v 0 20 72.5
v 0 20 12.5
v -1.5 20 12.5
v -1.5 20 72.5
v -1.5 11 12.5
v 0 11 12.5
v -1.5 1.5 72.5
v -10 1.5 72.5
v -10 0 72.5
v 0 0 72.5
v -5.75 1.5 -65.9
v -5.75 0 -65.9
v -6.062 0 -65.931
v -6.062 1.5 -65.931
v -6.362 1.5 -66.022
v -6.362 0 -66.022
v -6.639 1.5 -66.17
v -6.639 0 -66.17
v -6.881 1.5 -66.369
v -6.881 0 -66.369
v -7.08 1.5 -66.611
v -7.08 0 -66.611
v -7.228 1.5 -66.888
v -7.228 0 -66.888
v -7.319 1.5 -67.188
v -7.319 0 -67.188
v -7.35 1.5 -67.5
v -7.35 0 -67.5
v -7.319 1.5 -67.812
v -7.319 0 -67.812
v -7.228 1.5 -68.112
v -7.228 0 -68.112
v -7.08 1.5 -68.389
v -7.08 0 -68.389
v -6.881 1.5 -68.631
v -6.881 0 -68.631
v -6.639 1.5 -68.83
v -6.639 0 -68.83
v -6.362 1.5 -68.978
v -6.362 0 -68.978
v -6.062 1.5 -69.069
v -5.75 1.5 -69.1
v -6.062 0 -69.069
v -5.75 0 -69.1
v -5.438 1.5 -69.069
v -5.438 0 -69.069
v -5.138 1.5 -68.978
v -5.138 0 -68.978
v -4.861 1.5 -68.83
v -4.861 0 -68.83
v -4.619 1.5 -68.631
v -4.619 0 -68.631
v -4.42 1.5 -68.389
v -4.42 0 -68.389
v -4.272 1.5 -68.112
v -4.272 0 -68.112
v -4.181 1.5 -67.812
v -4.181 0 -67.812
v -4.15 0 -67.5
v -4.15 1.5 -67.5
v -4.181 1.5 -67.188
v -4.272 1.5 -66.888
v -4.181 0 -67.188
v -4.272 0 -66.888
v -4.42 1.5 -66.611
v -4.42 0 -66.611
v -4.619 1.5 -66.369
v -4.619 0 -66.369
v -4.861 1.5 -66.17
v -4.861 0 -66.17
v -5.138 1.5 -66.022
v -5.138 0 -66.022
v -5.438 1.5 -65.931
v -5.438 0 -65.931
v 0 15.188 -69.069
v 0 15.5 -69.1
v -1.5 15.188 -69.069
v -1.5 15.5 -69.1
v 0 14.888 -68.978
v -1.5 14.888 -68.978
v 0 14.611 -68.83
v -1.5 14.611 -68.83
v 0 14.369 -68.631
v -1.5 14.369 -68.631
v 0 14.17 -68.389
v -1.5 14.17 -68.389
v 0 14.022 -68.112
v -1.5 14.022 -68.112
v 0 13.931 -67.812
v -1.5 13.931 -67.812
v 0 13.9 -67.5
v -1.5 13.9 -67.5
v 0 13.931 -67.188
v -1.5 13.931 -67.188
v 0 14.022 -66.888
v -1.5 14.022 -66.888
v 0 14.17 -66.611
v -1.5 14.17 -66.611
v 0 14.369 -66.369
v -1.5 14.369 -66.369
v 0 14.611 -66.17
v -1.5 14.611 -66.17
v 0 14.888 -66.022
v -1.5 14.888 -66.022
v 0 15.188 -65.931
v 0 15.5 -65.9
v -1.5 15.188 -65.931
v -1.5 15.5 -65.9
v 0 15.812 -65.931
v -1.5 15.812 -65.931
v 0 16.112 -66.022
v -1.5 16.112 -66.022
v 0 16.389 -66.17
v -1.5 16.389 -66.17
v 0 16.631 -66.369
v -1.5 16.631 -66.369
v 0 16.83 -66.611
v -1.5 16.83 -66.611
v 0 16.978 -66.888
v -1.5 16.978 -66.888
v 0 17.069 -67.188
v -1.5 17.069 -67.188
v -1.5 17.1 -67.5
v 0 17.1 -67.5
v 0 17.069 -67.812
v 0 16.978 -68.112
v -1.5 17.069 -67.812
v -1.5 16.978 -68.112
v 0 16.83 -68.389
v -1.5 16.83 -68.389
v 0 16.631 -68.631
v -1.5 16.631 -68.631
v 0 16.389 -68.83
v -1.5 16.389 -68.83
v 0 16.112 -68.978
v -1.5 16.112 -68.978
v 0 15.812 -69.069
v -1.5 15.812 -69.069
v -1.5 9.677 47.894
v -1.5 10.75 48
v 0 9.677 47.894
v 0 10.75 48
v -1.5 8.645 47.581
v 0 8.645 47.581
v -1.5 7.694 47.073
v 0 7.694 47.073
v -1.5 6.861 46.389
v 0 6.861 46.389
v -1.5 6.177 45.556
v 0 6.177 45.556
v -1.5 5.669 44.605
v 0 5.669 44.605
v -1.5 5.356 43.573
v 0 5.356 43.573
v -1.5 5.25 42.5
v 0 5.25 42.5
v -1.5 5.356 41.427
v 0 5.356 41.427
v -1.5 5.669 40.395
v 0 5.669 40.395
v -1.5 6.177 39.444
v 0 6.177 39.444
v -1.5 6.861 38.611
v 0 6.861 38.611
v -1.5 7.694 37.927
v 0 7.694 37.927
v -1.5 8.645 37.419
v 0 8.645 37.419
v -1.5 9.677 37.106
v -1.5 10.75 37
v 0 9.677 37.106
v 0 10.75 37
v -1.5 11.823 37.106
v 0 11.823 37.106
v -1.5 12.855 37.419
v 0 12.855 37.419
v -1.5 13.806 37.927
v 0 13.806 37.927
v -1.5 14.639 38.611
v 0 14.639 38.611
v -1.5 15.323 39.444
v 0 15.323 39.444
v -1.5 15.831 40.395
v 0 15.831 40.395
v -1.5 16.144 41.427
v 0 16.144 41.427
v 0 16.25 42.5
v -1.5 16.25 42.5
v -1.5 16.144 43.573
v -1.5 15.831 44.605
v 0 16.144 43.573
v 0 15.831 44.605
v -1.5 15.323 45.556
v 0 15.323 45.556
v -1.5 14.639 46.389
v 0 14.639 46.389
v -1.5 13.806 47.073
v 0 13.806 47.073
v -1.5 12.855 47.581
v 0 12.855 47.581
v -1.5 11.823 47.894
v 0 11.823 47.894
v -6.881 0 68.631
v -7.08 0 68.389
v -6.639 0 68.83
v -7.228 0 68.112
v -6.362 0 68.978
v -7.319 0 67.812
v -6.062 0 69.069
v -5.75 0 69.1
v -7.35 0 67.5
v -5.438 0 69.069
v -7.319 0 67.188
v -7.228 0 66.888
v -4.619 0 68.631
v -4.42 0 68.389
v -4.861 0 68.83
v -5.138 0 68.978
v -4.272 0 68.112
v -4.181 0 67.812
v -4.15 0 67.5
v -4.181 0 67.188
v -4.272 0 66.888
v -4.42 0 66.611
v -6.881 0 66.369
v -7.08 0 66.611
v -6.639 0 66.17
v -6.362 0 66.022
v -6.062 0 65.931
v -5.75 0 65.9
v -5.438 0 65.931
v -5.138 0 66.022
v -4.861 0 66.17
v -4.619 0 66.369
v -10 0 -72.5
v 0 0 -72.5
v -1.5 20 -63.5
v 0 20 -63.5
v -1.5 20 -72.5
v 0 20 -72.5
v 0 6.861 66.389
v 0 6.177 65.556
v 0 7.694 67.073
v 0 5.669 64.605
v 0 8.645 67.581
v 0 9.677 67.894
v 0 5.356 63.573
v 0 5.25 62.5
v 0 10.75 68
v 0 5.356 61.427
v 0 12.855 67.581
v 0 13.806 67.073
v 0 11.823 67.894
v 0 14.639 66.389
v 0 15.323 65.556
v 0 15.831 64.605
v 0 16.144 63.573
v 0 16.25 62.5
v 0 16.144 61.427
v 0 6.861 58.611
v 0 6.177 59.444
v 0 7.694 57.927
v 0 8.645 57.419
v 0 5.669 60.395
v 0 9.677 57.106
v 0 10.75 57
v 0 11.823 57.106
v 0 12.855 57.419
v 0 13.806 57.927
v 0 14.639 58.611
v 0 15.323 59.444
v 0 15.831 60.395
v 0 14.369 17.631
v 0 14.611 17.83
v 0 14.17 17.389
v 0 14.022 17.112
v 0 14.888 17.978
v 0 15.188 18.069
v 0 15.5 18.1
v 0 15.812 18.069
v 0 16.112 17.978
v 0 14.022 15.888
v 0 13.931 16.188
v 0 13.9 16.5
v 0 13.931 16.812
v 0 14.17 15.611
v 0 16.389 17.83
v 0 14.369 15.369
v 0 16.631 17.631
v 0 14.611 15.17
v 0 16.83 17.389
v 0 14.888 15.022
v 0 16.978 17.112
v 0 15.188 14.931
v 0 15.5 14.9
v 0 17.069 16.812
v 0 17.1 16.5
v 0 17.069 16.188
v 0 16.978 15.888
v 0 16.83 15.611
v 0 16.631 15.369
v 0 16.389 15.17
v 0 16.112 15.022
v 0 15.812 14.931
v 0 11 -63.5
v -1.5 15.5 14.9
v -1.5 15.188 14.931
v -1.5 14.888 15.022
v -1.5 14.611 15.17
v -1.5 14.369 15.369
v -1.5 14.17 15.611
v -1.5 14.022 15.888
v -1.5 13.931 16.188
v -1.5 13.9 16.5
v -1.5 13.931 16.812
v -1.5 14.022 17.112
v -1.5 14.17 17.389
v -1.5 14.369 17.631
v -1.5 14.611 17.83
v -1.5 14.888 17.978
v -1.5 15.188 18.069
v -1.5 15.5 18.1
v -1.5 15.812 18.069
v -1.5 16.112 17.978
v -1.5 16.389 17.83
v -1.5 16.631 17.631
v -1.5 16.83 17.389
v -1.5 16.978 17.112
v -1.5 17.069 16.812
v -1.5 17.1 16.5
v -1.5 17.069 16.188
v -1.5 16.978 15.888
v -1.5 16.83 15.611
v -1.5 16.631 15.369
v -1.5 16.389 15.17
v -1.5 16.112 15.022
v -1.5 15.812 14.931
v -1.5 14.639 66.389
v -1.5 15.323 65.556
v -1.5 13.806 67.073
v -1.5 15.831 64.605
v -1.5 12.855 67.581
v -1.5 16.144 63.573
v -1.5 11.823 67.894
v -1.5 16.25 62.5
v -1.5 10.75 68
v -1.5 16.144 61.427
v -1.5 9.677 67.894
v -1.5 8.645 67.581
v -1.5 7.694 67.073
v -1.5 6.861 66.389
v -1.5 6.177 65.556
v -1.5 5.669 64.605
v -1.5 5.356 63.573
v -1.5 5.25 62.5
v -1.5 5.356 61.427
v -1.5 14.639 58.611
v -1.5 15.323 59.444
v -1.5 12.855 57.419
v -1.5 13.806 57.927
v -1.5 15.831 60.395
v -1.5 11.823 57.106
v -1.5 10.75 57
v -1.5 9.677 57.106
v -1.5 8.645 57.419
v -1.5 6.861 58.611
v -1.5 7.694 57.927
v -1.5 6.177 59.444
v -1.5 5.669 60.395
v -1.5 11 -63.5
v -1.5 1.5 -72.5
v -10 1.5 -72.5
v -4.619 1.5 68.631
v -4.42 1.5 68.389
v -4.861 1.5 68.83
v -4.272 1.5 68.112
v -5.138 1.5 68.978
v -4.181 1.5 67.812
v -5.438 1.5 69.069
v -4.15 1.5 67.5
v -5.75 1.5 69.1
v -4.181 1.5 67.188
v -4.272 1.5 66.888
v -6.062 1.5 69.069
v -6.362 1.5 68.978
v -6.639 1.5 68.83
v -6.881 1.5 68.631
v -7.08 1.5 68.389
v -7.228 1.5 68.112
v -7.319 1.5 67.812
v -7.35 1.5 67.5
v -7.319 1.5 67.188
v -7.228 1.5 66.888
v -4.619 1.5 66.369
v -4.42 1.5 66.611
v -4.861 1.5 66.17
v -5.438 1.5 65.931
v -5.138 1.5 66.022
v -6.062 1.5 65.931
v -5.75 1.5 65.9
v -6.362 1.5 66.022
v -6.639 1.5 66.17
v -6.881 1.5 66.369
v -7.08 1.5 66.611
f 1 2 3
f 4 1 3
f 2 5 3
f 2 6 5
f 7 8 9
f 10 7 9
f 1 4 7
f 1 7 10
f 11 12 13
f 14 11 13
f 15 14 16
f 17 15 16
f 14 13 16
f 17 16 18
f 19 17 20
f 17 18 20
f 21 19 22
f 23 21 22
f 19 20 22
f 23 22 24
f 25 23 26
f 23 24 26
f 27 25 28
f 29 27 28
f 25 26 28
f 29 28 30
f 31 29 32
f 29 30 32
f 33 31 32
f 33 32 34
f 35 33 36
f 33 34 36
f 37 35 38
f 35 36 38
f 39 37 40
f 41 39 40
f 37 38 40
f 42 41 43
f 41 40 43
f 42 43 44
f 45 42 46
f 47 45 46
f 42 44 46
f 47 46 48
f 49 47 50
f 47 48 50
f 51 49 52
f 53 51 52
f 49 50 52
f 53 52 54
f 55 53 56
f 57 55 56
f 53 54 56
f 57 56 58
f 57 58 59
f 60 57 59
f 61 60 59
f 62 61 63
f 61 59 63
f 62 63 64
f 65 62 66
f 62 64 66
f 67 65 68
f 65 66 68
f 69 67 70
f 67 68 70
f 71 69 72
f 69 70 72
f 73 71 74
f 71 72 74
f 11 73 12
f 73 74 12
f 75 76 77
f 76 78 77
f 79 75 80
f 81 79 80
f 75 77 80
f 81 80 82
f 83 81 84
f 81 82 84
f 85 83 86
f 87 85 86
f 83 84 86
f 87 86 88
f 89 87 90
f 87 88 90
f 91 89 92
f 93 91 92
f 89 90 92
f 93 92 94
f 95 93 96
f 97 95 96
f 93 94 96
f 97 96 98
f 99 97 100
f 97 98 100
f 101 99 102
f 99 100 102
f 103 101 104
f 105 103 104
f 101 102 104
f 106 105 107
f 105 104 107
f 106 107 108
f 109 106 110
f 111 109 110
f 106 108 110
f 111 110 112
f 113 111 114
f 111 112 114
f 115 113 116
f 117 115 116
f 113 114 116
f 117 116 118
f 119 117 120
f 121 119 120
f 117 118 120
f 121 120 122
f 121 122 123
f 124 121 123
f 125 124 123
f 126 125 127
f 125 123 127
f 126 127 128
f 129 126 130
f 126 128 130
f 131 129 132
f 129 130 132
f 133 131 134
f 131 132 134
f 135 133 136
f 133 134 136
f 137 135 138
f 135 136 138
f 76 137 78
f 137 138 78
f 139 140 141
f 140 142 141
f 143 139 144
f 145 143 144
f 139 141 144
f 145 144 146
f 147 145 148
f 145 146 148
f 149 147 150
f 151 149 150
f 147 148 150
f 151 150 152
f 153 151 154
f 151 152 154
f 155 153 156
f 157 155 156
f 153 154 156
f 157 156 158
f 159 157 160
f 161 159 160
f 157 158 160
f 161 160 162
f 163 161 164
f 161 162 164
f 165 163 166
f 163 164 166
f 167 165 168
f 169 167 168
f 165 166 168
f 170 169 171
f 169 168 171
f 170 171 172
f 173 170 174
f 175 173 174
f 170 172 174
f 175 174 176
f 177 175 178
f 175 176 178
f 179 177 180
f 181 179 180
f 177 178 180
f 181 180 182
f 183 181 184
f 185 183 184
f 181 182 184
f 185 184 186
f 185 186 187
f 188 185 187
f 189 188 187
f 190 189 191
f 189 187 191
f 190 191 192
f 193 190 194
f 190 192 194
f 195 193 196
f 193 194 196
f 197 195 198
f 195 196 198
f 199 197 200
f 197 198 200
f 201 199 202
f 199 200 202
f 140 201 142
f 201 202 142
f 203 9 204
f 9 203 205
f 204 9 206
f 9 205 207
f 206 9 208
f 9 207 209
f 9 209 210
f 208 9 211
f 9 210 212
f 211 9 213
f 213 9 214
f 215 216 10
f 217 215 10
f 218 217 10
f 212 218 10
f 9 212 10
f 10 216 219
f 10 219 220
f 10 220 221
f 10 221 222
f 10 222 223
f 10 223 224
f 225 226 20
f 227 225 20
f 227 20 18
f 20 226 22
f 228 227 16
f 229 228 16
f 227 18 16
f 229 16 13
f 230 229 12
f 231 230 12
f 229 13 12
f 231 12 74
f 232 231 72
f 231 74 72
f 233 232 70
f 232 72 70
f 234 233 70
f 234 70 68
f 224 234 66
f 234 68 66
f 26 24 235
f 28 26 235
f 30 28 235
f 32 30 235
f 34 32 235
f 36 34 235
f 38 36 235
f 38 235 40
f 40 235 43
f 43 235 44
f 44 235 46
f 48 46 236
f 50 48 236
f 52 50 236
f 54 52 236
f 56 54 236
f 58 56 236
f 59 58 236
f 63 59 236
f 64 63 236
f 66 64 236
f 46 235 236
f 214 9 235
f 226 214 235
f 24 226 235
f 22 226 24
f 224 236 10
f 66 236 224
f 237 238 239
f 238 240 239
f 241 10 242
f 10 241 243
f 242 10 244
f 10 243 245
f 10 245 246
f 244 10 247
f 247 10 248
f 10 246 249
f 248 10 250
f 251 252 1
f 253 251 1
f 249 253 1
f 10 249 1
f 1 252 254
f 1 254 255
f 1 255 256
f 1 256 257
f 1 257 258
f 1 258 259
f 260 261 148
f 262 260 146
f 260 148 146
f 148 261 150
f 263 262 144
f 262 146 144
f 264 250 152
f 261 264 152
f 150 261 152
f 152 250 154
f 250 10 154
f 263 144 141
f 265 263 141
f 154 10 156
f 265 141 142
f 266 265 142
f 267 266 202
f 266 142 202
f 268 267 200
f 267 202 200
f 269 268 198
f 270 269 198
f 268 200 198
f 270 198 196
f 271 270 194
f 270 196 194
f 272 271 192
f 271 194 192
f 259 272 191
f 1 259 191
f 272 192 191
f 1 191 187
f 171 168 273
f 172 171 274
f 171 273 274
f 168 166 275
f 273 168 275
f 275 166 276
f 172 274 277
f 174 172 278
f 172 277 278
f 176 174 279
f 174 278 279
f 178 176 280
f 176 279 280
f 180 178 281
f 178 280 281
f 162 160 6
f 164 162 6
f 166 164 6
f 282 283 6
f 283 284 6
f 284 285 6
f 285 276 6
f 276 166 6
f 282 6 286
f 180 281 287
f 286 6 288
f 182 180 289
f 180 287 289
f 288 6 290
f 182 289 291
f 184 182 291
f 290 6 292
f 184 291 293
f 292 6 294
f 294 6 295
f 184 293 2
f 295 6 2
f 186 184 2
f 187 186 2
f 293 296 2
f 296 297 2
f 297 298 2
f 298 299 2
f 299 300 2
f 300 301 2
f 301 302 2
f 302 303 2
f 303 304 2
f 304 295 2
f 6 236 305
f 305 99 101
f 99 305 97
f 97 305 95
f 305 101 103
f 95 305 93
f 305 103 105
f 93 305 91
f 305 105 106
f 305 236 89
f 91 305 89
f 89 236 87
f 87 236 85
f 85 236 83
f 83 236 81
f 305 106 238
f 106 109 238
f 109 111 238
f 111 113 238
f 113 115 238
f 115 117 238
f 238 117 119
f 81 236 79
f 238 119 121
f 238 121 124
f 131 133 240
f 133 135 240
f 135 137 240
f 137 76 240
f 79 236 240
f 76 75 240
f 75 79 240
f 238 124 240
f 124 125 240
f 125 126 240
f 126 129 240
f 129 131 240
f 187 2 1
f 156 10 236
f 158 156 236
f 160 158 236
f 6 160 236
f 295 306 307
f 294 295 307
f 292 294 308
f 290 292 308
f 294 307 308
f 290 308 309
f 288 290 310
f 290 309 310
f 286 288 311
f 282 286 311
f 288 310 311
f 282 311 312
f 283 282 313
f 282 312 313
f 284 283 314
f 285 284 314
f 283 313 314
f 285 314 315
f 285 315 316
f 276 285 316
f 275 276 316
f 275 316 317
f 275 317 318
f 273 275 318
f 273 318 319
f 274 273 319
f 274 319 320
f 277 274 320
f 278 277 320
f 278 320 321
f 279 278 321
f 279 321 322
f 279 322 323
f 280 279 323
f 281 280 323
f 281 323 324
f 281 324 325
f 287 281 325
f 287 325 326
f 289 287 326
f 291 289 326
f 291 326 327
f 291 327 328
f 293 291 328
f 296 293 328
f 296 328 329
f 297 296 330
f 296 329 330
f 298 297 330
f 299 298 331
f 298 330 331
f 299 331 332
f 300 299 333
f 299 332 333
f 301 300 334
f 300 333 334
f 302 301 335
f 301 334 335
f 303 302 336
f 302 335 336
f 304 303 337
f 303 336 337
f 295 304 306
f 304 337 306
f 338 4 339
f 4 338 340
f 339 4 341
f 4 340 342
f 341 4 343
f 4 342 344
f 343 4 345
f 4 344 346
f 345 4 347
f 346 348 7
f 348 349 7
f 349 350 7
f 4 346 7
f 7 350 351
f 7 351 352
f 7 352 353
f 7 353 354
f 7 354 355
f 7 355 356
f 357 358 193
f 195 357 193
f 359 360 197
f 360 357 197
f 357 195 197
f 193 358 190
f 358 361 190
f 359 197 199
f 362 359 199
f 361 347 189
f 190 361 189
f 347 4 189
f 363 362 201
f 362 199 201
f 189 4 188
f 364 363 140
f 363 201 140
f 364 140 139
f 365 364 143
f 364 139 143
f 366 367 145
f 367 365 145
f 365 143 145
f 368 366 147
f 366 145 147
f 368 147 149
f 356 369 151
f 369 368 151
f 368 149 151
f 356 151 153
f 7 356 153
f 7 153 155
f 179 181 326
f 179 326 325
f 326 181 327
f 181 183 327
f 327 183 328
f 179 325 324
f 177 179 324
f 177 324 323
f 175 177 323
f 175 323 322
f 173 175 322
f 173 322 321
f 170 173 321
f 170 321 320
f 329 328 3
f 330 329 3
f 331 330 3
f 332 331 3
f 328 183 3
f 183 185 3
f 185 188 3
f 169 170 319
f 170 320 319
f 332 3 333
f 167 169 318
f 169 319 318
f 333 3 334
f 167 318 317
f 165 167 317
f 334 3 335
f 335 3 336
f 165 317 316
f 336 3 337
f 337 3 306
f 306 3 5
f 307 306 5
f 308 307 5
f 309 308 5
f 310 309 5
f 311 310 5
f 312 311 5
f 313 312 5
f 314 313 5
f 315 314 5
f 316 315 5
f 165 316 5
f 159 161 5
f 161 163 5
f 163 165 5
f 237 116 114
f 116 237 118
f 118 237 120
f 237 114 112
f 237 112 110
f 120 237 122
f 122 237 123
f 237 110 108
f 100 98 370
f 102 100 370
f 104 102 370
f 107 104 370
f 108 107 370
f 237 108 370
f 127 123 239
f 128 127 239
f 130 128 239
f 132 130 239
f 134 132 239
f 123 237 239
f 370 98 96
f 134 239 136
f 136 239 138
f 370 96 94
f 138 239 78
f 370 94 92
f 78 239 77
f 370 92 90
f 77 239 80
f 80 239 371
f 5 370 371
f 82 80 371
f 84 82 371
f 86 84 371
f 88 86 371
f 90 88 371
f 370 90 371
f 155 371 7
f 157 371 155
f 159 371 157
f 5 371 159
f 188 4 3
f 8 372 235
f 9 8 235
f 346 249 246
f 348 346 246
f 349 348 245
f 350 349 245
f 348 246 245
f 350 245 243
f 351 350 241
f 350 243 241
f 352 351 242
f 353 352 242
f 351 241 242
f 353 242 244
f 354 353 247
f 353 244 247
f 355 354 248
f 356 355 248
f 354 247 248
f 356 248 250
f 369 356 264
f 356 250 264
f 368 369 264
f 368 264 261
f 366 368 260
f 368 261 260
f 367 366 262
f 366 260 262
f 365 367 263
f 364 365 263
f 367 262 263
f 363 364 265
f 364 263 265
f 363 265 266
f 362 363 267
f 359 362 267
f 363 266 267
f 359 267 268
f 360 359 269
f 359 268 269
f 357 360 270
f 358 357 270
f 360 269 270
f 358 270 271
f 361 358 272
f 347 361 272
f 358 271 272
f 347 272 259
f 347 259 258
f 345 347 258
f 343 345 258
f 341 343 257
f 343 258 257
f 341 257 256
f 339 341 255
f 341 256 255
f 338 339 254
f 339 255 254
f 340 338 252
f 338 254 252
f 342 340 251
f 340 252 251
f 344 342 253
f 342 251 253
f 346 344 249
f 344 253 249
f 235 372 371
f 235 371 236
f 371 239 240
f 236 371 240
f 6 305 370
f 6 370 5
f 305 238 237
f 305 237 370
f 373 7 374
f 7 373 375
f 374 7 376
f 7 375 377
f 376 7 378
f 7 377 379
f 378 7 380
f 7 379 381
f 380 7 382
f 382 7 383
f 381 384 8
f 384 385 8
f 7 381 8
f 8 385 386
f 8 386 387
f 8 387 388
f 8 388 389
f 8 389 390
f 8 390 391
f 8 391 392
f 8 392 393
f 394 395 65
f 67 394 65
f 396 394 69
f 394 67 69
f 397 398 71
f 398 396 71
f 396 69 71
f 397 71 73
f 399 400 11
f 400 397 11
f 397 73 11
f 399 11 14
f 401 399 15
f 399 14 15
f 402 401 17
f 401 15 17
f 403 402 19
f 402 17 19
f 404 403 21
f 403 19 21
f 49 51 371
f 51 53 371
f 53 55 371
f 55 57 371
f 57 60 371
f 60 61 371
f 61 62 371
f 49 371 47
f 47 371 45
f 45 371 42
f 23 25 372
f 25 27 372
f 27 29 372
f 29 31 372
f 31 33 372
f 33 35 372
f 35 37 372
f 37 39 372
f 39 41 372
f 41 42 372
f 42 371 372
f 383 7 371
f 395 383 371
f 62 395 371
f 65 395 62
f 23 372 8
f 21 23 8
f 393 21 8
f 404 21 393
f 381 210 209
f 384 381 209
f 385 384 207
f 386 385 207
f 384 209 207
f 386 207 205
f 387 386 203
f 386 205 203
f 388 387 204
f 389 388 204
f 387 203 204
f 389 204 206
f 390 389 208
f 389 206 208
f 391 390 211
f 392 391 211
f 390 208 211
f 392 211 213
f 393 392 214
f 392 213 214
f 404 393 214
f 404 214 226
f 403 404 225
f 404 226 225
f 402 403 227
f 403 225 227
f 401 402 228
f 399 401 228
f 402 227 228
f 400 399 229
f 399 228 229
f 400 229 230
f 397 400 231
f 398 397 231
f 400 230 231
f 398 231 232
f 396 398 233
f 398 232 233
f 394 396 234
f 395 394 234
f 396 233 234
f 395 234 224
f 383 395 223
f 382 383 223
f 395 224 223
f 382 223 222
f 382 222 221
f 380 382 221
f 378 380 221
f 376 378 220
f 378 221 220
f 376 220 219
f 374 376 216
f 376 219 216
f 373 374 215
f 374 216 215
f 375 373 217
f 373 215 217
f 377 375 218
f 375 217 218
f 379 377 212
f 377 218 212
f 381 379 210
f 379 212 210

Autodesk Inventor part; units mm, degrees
ref_plane "YZ Plane" through (0, 0, 0) normal (1, 0, 0) x (0, 1, 0)
ref_plane "XZ Plane" through (0, 0, 0) normal (0, 1, 0) x (-1, 0, 0)
ref_plane "XY Plane" through (0, 0, 0) normal (0, 0, 1) x (1, 0, 0)
sketch "Náčrt1" plane through (0, 0, 0) normal (0, 0, 1) x (1, 0, 0)
  line L0 (-10, 0) -> (0, 0)
  line L1 (0, 0) -> (0, 20)
  line L2 (0, 20) -> (-1.5, 20)
  line L3 (-1.5, 20) -> (-1.5, 1.5)
  line L4 (-1.5, 1.5) -> (-10, 1.5)
  line L5 (-10, 1.5) -> (-10, 0)
  line L6 (-12, 0) -> (2, 0) projected
  line L7 (0, 24) -> (0, -4) projected
  point P0 (0, 0)
  dimension "d0" = 20
  dimension "d1" = 10
  dimension "d2" = 1.5
  dimension "d3" = 1.5
extrude "Vysunutí1" add sketch "Náčrt1" along normal mid plane 145
sketch "Náčrt2" plane through (-10, 1.5, 72.5) normal (0, 1, 0) x (1, 0, 0)
  line L0 (0, 0) -> (0, 145) projected
  line L1 (8.5, 0) -> (0, 0) projected
  line L2 (8.5, 145) -> (8.5, 0) projected
  line L3 (0, 145) -> (8.5, 145) projected
  point P0 (10, 72.5)
  point P1 (4.25, 140)
  point P2 (4.25, 5)
  point P3 (4.25, 0)
  dimension "d6" = 4.25
  dimension "d7" = 4.25
  dimension "d57" = 5
  dimension "d78" = 5
hole "Díra1" at (-5.75, 1.5, -67.5) at (-5.75, 1.5, 67.5) direction (0, -1, 0) diameter 3.2 end through all
sketch "Náčrt9" plane through (-1.5, 1.5, 72.5) normal (-1, 0, 0) x (0, 0, 1)
  line L0 (-145, 18.5) -> (0, 18.5) projected
  line L1 (0, 18.5) -> (0, 0) projected
  point P0 (-72.5, -1.5)
  point P1 (-10, 9.25)
  point P2 (-30, 9.25)
  dimension "d79" = 9.25
  dimension "d80" = 9.25
  dimension "d81" = 10
  dimension "d82" = 30
hole "Díra7" at (-1.5, 10.75, 62.5) at (-1.5, 10.75, 42.5) direction (1, 0, 0) diameter 11 end through all
sketch "Náčrt10" plane through (0, 0, 72.5) normal (1, 0, 0) x (0, 0, -1)
  circle A0 centre (30, 10.75) radius 5.5 projected
  circle A1 centre (10, 10.75) radius 5.5 projected
  line L0 (145, 20) -> (0, 20) projected
  line L1 (0, 0) -> (0, 20) projected
  line L2 (145, 0) -> (0, 0) projected
  line L3 (145, 20) -> (145, 0) projected
  line L4 (60, 20) -> (136, 20)
  line L5 (136, 20) -> (136, 11)
  line L6 (136, 11) -> (60, 11)
  line L7 (60, 11) -> (60, 20)
  point P0 (72.5, 0)
  point P1 (60, 15.5)
  dimension "d90" = 76
  dimension "d91" = 9
  dimension "d92" = 60
extrude "Vysunutí3" cut sketch "Náčrt10" against normal through all contours L5 L6 L7 L0
sketch "Náčrt11" plane through (0, 0, 72.5) normal (1, 0, 0) x (0, 0, -1)
  line L0 (136, 20) -> (136, 11) projected
  line L1 (136, 11) -> (60, 11) projected
  line L2 (60, 11) -> (60, 20) projected
  line L3 (60, 20) -> (0, 20) projected
  line L4 (0, 0) -> (0, 20) projected
  line L5 (145, 0) -> (0, 0) projected
  line L6 (145, 20) -> (145, 0) projected
  line L7 (145, 20) -> (136, 20) projected
  circle A0 centre (10, 10.75) radius 5.5 projected
  circle A1 centre (30, 10.75) radius 5.5 projected
  point P0 (72.5, 0)
  point P1 (56, 15.5)
  point P2 (140, 15.5)
  point P3 (140.5, 20)
  point P4 (136, 15.5)
  dimension "d96" = 4.5
  dimension "d97" = 4
  dimension "d98" = 4.5
  dimension "d99" = 4
hole "Díra8" at (0, 15.5, 16.5) at (0, 15.5, -67.5) direction (-1, 0, 0) diameter 3.2 end through all
properties part number "panel" material "Hliník 6061"
